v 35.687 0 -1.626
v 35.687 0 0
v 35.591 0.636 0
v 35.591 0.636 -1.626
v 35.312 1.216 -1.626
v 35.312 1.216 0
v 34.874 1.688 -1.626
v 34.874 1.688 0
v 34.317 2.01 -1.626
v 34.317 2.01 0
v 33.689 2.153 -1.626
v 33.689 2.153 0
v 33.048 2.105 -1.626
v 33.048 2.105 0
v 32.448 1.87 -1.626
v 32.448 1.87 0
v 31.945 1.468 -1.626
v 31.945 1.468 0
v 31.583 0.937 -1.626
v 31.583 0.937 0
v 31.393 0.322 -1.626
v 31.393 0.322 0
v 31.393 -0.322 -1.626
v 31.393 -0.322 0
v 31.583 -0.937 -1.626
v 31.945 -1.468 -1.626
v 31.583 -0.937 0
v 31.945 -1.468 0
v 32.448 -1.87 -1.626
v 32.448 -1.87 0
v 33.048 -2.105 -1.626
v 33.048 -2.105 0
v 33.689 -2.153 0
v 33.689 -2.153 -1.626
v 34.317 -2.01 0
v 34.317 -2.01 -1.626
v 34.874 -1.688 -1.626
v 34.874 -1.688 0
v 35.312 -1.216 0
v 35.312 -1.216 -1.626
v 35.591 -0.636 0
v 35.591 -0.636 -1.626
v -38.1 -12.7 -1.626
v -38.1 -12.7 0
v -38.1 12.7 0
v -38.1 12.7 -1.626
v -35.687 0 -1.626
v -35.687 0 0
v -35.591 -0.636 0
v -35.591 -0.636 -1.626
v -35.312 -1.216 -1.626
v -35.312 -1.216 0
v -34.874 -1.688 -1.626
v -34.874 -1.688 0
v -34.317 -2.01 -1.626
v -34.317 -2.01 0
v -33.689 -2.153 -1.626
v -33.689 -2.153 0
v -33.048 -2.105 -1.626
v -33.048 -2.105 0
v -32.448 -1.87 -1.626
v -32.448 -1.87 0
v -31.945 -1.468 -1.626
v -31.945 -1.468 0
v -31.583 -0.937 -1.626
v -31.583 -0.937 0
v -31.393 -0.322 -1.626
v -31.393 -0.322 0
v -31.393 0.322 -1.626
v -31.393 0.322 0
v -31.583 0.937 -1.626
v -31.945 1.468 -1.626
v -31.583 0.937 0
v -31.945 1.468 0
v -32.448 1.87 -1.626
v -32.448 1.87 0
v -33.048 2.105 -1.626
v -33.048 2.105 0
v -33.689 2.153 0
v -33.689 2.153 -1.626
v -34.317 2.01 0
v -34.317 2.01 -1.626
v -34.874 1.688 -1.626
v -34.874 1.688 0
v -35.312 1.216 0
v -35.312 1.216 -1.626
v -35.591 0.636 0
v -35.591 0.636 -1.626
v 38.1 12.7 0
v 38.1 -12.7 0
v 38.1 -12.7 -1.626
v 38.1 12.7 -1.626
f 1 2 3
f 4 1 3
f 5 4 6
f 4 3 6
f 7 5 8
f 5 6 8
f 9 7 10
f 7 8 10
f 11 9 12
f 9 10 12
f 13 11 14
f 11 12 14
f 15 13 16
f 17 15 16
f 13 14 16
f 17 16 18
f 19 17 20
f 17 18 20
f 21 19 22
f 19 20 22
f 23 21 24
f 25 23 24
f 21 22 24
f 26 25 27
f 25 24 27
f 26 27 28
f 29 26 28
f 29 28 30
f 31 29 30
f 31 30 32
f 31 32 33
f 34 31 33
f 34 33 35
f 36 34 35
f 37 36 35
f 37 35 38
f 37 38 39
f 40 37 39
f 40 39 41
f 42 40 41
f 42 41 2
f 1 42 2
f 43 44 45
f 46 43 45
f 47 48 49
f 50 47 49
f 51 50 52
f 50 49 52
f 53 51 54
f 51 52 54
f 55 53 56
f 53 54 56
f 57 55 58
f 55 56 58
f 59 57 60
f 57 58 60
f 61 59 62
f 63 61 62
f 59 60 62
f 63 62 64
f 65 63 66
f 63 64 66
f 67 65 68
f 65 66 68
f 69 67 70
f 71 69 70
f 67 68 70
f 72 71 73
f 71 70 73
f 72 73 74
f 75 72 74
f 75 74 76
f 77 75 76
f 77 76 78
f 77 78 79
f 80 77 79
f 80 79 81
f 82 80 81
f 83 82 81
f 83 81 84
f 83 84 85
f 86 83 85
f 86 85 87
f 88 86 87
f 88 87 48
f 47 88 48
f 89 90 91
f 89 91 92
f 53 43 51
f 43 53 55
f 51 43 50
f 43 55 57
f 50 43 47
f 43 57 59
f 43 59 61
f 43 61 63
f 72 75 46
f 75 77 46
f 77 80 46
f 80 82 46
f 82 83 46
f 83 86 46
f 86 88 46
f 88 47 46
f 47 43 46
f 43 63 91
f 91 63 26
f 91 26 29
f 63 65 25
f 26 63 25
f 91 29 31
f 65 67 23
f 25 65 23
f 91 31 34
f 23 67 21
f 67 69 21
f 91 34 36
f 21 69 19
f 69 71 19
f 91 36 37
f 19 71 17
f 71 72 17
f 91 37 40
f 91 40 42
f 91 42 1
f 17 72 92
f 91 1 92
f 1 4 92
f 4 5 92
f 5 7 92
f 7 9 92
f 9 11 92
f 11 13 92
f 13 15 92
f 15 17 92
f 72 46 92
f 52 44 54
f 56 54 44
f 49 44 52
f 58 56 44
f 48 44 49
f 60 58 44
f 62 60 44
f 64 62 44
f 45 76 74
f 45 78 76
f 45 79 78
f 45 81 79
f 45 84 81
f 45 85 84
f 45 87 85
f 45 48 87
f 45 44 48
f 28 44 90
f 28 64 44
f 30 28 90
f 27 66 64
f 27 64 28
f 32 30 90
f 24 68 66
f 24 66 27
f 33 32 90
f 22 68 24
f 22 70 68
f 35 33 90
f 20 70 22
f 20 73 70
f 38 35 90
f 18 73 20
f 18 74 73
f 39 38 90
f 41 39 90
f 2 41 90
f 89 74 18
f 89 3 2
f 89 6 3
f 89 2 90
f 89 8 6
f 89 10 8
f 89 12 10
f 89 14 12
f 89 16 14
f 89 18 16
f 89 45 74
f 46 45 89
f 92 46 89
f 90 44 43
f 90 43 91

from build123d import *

# Parameters (mm, degrees)
SKETCH1_W           = 76.2
SKETCH1_H           = 25.4
BOSS_EXTRUDE1_DEPTH = 1.6256
SKETCH2_R           = 2.159
CUT_EXTRUDE1_DEPTH  = 41.19381265


with BuildPart() as part:
    # Sketch1 → Boss-Extrude1 (new body)
    with BuildSketch(Plane.XY):
        Rectangle(SKETCH1_W, SKETCH1_H)
    extrude(amount=-BOSS_EXTRUDE1_DEPTH)

    # Sketch2 → Cut-Extrude1 (cut, through all)
    with BuildSketch(Plane.XY):
        with Locations((33.528, 0)):
            Circle(SKETCH2_R)
        with Locations(Location((-33.528, 0, 0), (0, 0, 180))):
            Circle(SKETCH2_R)
    extrude(amount=-CUT_EXTRUDE1_DEPTH, mode=Mode.SUBTRACT)


solid = part.part
